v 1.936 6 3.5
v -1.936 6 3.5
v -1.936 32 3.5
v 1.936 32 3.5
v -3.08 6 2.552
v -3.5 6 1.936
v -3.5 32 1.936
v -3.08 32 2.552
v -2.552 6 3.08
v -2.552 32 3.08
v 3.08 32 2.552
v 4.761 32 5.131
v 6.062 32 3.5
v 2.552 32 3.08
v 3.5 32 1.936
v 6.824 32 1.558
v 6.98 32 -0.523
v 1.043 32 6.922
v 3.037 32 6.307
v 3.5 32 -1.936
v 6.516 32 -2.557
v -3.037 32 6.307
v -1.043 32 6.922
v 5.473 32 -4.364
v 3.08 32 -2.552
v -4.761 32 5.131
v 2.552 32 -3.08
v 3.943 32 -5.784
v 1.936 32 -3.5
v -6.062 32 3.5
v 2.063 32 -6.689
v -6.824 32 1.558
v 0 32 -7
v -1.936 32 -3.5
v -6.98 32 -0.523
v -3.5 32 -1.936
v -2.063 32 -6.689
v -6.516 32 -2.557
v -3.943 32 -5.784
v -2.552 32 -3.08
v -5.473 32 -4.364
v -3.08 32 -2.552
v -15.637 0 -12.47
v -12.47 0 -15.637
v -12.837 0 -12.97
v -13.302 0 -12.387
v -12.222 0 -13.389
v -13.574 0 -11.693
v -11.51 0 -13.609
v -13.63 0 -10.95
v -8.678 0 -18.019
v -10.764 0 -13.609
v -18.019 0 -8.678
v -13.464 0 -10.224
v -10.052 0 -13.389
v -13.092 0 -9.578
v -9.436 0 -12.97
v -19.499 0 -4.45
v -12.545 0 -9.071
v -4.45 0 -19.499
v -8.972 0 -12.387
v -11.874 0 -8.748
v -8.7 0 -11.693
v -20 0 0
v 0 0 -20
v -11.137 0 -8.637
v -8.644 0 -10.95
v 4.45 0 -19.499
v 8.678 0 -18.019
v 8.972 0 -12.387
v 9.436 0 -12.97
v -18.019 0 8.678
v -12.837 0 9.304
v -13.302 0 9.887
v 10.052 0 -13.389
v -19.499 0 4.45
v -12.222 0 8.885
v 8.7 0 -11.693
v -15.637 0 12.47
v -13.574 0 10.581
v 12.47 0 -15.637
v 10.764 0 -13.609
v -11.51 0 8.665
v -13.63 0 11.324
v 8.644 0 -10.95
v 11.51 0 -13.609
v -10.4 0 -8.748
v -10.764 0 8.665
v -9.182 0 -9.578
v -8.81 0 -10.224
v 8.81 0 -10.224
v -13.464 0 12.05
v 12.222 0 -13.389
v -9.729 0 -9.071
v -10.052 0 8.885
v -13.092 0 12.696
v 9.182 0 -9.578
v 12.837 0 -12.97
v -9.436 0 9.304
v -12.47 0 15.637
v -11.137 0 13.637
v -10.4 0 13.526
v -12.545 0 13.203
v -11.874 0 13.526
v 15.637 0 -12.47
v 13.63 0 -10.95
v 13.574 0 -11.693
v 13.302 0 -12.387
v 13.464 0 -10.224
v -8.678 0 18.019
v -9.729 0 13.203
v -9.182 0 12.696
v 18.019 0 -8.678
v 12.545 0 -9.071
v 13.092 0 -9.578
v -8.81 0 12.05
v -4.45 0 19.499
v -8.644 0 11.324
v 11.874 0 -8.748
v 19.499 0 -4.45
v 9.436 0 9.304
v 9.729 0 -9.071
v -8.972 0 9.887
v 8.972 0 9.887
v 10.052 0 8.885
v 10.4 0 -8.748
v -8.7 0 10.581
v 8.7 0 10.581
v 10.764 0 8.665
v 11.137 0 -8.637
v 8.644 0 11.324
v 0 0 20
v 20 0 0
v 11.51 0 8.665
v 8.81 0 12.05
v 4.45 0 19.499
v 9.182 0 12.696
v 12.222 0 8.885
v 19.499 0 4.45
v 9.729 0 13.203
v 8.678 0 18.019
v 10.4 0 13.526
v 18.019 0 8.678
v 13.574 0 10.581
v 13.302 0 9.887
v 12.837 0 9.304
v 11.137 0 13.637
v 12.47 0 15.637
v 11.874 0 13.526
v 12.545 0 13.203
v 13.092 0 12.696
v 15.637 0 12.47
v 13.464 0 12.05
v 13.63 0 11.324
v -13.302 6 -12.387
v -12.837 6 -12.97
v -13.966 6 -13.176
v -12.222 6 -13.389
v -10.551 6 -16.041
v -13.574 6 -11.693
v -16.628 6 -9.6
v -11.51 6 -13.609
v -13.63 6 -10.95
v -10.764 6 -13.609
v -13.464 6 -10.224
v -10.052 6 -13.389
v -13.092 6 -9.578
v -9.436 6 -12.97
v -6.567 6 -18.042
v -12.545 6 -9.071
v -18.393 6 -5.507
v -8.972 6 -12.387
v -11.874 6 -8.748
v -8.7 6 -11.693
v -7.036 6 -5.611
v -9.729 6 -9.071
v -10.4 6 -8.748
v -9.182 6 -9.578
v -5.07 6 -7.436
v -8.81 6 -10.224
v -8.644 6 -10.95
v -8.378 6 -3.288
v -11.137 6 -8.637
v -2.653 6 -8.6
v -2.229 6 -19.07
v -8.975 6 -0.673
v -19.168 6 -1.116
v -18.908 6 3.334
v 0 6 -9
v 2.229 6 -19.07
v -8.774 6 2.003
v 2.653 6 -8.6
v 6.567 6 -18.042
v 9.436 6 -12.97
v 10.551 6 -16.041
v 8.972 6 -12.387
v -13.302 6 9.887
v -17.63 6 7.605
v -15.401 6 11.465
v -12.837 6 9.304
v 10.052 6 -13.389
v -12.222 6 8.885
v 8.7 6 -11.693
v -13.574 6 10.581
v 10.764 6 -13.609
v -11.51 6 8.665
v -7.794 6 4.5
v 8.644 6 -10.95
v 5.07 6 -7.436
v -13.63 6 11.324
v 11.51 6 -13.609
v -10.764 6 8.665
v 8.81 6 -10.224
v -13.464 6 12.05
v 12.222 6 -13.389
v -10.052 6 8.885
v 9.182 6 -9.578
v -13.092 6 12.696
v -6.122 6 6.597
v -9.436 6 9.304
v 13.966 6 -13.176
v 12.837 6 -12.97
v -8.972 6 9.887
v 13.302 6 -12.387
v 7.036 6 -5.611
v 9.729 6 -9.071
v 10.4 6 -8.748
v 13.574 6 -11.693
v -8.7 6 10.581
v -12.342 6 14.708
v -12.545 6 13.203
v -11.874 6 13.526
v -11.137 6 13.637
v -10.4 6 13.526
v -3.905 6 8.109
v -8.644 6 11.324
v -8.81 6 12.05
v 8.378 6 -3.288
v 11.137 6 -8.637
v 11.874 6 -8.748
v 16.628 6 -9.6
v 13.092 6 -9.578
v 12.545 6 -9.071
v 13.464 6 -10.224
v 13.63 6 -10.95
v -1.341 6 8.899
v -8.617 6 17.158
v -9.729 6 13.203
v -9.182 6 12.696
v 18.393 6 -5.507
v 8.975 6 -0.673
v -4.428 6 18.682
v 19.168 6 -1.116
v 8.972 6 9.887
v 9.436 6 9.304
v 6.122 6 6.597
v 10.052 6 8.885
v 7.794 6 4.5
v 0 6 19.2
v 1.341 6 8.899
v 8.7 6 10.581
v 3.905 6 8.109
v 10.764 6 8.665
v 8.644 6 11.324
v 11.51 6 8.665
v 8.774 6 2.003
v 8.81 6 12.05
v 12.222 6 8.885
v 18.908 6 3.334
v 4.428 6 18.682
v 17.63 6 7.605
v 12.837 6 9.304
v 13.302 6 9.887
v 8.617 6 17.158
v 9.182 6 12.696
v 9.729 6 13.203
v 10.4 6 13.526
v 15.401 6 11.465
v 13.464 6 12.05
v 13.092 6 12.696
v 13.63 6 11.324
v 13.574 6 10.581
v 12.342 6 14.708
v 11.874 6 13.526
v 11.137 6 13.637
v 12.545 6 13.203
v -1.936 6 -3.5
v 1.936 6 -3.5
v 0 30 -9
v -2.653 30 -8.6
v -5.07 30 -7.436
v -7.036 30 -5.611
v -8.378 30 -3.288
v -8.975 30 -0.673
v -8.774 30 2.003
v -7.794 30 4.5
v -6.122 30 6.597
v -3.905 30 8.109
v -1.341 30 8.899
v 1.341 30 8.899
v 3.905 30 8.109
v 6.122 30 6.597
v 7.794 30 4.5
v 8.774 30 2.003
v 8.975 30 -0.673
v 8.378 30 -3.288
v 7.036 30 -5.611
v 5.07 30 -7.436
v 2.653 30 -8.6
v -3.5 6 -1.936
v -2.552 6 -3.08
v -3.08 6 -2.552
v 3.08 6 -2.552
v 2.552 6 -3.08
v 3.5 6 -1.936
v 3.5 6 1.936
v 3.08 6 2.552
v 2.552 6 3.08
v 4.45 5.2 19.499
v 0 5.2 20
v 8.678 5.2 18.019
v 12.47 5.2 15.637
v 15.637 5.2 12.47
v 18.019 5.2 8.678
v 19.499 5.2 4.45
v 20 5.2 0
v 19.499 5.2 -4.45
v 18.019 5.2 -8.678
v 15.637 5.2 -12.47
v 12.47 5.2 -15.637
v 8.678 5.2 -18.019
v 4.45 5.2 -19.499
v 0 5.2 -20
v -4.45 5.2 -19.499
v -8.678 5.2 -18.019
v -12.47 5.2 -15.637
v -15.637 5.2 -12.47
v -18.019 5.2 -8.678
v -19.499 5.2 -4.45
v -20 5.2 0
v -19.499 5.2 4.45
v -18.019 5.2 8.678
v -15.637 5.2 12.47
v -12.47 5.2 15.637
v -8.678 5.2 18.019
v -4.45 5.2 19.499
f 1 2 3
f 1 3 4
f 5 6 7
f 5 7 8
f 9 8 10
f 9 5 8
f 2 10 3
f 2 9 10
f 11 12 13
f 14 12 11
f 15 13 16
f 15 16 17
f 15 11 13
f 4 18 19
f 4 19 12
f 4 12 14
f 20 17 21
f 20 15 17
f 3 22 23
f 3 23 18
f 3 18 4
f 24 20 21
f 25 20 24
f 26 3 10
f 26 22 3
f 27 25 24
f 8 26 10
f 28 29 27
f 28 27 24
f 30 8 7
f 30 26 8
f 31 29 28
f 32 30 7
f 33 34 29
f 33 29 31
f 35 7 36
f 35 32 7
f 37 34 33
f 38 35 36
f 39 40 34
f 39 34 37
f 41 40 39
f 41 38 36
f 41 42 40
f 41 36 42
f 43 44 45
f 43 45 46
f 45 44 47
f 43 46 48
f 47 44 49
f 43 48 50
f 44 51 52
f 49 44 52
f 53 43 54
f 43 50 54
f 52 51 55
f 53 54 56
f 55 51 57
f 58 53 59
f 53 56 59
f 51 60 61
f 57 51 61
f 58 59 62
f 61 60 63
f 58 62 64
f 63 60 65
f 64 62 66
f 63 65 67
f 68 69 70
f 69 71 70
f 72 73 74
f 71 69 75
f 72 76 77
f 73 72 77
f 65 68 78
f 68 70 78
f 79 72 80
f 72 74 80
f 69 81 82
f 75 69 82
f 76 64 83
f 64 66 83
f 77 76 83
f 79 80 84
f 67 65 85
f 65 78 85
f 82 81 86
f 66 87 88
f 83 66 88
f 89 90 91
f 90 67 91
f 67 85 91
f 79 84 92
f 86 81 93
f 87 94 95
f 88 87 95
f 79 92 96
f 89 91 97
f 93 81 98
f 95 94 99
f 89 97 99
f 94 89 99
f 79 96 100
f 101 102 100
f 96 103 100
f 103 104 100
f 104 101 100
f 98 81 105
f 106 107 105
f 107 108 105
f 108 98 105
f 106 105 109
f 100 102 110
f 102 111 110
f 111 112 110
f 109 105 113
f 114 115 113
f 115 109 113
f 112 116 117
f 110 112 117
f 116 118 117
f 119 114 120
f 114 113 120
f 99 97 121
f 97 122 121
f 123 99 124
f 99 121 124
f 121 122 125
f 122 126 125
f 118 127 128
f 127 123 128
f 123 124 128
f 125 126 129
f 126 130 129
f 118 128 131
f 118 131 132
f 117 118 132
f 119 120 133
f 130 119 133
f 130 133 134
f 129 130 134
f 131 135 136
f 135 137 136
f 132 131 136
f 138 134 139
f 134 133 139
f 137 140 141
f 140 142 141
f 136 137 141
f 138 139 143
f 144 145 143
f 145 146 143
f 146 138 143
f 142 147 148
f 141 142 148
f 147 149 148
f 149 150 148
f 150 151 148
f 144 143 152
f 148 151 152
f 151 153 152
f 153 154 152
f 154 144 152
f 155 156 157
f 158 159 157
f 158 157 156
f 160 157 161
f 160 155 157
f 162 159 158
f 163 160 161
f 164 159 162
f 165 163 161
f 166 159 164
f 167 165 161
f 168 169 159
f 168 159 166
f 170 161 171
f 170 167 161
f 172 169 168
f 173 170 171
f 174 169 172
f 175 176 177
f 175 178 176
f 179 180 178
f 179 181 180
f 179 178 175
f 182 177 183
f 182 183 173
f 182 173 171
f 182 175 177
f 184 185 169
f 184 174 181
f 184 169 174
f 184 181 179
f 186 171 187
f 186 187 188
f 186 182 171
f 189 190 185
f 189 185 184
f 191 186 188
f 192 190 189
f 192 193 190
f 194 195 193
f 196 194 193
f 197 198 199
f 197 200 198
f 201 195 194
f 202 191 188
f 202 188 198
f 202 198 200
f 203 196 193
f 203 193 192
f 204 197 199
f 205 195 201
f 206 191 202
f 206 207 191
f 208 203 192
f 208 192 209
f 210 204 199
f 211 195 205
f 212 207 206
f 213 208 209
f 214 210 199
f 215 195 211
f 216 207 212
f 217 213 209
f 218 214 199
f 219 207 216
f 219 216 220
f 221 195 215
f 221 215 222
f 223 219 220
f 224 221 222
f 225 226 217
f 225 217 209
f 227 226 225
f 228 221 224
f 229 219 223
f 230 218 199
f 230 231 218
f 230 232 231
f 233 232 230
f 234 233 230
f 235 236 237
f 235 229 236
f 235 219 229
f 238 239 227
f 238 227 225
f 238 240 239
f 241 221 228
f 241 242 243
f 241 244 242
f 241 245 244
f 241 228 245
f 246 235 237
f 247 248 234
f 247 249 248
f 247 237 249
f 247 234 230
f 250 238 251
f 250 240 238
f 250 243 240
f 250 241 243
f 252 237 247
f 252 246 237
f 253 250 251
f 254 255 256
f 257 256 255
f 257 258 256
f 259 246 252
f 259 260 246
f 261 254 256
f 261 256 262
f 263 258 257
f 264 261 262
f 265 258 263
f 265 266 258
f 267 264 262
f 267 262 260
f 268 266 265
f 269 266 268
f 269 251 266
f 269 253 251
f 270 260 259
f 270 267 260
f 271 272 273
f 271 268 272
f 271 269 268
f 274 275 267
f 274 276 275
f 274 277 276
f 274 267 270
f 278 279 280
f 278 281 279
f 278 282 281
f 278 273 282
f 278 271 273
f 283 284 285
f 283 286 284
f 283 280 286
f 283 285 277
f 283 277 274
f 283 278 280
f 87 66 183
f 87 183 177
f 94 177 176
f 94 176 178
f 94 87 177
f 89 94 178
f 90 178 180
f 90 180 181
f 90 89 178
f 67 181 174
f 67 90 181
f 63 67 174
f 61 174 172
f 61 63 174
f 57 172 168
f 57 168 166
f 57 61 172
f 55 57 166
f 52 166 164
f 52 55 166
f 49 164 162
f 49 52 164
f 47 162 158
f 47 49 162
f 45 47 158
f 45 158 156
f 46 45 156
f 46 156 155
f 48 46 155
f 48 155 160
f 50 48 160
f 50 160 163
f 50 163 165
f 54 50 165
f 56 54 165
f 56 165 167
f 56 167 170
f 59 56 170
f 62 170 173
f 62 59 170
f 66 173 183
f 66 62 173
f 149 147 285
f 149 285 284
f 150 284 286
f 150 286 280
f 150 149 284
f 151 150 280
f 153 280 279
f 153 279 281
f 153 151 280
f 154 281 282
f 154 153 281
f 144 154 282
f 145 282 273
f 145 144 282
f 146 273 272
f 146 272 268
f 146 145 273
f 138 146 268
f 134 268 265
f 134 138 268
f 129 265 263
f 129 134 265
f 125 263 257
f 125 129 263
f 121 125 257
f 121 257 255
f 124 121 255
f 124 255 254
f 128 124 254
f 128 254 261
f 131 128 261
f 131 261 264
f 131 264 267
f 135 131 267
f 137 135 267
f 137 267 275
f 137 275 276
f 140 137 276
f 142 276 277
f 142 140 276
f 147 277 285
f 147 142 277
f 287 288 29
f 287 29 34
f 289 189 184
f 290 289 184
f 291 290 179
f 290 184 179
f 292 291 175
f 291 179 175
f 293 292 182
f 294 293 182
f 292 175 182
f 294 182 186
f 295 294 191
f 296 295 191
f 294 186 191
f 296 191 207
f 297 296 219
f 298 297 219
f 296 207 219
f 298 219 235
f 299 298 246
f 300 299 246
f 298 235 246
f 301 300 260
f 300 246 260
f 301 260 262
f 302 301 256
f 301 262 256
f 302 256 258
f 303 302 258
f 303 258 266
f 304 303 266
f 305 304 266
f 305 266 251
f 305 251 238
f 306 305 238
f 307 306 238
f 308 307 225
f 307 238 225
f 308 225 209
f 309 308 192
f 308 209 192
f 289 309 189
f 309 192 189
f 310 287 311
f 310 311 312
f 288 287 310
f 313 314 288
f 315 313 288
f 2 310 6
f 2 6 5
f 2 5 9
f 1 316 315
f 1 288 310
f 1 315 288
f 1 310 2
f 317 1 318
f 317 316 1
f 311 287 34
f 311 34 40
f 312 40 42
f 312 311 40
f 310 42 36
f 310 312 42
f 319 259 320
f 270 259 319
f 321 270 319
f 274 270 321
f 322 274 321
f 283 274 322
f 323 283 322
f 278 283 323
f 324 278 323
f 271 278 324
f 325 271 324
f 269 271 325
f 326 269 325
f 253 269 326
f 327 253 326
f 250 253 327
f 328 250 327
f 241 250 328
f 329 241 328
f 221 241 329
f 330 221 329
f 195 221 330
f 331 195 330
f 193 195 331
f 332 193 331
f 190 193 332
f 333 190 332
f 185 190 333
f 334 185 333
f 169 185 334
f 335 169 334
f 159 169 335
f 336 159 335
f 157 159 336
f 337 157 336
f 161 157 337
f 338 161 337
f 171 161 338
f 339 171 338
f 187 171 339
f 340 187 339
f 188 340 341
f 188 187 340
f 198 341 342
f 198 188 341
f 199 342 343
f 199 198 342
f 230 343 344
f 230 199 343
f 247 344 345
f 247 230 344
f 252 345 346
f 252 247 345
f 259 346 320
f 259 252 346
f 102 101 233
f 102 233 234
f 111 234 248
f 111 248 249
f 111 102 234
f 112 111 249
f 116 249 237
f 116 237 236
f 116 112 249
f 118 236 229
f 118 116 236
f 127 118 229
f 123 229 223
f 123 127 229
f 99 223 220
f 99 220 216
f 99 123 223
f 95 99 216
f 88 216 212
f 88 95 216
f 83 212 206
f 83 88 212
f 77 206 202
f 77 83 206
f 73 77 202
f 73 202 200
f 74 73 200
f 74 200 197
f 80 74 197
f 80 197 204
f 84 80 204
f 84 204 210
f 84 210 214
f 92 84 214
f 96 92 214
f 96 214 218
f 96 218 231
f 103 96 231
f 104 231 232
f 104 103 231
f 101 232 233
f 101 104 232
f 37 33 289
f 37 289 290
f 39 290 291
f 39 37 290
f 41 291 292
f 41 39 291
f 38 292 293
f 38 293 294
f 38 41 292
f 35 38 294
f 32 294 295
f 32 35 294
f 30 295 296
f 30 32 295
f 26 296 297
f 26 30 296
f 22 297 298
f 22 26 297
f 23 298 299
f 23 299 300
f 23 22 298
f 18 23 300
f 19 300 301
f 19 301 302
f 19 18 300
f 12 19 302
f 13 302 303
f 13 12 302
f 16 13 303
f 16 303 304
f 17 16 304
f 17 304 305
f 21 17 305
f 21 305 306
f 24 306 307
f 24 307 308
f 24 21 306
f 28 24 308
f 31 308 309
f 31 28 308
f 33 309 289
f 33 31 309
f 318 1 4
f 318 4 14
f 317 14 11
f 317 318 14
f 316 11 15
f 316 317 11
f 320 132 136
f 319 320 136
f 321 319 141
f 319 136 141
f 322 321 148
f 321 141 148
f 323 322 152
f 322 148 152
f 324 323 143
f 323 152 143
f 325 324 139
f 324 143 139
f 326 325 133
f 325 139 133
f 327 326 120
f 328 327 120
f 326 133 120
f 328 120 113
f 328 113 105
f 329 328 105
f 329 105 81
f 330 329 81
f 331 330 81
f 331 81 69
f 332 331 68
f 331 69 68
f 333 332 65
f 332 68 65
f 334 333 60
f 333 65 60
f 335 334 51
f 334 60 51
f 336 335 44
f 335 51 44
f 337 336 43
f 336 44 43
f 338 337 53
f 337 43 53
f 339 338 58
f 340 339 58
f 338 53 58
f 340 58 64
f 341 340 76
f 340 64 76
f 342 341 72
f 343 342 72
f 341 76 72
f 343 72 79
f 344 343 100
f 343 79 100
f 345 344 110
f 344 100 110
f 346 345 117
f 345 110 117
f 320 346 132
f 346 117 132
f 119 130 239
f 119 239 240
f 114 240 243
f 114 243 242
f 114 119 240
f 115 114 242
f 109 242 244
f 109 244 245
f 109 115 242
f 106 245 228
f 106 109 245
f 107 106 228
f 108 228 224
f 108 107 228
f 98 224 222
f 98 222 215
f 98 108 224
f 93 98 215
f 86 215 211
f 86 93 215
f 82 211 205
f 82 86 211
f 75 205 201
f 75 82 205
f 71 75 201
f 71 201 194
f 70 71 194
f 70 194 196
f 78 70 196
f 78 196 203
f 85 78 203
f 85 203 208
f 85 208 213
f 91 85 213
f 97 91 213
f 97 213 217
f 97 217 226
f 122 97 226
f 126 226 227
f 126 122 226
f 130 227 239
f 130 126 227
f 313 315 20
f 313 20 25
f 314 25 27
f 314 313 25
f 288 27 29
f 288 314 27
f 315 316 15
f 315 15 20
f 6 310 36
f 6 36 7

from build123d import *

# Parameters (mm, degrees)
SKETCH_1_R      = 20
SKETCH_1_R_2    = 2.5
EXTRUDE_1_DEPTH = 6
SKETCH_2_R      = 9
EXTRUDE_2_DEPTH = 26
CHAMFER_1_SIZE  = 0.8
CHAMFER_2_SIZE  = 2


with BuildPart() as part:
    # 草图1 → 凸台-拉伸1 (new body)
    with BuildSketch(Plane(origin=(0, 0, 0), x_dir=(1, 0, 0), z_dir=(0, 1, 0))):
        with Locations(Location((0, 0, 0), (0, 0, 270))):
            Circle(SKETCH_1_R)
        with Locations(Location((-11.136931804, 11.136931804, 0), (0, 0, 270))):
            Circle(SKETCH_1_R_2, mode=Mode.SUBTRACT)
        with Locations(Location((11.136931804, 11.136931804, 0), (0, 0, 270))):
            Circle(SKETCH_1_R_2, mode=Mode.SUBTRACT)
        with Locations(Location((11.136931804, -11.136931804, 0), (0, 0, 270))):
            Circle(SKETCH_1_R_2, mode=Mode.SUBTRACT)
        with Locations(Location((-11.136931804, -11.136931804, 0), (0, 0, 270))):
            Circle(SKETCH_1_R_2, mode=Mode.SUBTRACT)
    extrude(amount=EXTRUDE_1_DEPTH)

    # 草图2 → 凸台-拉伸2 (add)
    with BuildSketch(Plane(origin=(0, 6, 0), x_dir=(1, 0, 0), z_dir=(0, 1, 0))):
        with Locations(Location((0, 0, 0), (0, 0, 90))):
            Circle(SKETCH_2_R)
        with BuildLine():
            Line((1.936491673, 3.5), (-1.936491673, 3.5))
            ThreePointArc((-1.936491673, 3.5), (-2.828427125, 2.828427125), (-3.5, 1.936491673))
            Line((-3.5, 1.936491673), (-3.5, -1.936491673))
            ThreePointArc((-3.5, -1.936491673), (-2.828427125, -2.828427125), (-1.936491673, -3.5))
            Line((-1.936491673, -3.5), (1.936491673, -3.5))
            ThreePointArc((1.936491673, -3.5), (2.828427125, -2.828427125), (3.5, -1.936491673))
            Line((3.5, -1.936491673), (3.5, 1.936491673))
            ThreePointArc((3.5, 1.936491673), (2.828427125, 2.828427125), (1.936491673, 3.5))
        make_face(mode=Mode.SUBTRACT)
    extrude(amount=EXTRUDE_2_DEPTH)

    # 倒角1
    chamfer_1_edges = [part.edges().sort_by_distance(p)[0] for p in [
        (0, 6, -20),
    ]]
    chamfer(chamfer_1_edges, length=CHAMFER_1_SIZE)

    # 倒角2
    chamfer_2_edges = [part.edges().sort_by_distance(p)[0] for p in [
        (0, 32, 9),
    ]]
    chamfer(chamfer_2_edges, length=CHAMFER_2_SIZE)


solid = part.part
